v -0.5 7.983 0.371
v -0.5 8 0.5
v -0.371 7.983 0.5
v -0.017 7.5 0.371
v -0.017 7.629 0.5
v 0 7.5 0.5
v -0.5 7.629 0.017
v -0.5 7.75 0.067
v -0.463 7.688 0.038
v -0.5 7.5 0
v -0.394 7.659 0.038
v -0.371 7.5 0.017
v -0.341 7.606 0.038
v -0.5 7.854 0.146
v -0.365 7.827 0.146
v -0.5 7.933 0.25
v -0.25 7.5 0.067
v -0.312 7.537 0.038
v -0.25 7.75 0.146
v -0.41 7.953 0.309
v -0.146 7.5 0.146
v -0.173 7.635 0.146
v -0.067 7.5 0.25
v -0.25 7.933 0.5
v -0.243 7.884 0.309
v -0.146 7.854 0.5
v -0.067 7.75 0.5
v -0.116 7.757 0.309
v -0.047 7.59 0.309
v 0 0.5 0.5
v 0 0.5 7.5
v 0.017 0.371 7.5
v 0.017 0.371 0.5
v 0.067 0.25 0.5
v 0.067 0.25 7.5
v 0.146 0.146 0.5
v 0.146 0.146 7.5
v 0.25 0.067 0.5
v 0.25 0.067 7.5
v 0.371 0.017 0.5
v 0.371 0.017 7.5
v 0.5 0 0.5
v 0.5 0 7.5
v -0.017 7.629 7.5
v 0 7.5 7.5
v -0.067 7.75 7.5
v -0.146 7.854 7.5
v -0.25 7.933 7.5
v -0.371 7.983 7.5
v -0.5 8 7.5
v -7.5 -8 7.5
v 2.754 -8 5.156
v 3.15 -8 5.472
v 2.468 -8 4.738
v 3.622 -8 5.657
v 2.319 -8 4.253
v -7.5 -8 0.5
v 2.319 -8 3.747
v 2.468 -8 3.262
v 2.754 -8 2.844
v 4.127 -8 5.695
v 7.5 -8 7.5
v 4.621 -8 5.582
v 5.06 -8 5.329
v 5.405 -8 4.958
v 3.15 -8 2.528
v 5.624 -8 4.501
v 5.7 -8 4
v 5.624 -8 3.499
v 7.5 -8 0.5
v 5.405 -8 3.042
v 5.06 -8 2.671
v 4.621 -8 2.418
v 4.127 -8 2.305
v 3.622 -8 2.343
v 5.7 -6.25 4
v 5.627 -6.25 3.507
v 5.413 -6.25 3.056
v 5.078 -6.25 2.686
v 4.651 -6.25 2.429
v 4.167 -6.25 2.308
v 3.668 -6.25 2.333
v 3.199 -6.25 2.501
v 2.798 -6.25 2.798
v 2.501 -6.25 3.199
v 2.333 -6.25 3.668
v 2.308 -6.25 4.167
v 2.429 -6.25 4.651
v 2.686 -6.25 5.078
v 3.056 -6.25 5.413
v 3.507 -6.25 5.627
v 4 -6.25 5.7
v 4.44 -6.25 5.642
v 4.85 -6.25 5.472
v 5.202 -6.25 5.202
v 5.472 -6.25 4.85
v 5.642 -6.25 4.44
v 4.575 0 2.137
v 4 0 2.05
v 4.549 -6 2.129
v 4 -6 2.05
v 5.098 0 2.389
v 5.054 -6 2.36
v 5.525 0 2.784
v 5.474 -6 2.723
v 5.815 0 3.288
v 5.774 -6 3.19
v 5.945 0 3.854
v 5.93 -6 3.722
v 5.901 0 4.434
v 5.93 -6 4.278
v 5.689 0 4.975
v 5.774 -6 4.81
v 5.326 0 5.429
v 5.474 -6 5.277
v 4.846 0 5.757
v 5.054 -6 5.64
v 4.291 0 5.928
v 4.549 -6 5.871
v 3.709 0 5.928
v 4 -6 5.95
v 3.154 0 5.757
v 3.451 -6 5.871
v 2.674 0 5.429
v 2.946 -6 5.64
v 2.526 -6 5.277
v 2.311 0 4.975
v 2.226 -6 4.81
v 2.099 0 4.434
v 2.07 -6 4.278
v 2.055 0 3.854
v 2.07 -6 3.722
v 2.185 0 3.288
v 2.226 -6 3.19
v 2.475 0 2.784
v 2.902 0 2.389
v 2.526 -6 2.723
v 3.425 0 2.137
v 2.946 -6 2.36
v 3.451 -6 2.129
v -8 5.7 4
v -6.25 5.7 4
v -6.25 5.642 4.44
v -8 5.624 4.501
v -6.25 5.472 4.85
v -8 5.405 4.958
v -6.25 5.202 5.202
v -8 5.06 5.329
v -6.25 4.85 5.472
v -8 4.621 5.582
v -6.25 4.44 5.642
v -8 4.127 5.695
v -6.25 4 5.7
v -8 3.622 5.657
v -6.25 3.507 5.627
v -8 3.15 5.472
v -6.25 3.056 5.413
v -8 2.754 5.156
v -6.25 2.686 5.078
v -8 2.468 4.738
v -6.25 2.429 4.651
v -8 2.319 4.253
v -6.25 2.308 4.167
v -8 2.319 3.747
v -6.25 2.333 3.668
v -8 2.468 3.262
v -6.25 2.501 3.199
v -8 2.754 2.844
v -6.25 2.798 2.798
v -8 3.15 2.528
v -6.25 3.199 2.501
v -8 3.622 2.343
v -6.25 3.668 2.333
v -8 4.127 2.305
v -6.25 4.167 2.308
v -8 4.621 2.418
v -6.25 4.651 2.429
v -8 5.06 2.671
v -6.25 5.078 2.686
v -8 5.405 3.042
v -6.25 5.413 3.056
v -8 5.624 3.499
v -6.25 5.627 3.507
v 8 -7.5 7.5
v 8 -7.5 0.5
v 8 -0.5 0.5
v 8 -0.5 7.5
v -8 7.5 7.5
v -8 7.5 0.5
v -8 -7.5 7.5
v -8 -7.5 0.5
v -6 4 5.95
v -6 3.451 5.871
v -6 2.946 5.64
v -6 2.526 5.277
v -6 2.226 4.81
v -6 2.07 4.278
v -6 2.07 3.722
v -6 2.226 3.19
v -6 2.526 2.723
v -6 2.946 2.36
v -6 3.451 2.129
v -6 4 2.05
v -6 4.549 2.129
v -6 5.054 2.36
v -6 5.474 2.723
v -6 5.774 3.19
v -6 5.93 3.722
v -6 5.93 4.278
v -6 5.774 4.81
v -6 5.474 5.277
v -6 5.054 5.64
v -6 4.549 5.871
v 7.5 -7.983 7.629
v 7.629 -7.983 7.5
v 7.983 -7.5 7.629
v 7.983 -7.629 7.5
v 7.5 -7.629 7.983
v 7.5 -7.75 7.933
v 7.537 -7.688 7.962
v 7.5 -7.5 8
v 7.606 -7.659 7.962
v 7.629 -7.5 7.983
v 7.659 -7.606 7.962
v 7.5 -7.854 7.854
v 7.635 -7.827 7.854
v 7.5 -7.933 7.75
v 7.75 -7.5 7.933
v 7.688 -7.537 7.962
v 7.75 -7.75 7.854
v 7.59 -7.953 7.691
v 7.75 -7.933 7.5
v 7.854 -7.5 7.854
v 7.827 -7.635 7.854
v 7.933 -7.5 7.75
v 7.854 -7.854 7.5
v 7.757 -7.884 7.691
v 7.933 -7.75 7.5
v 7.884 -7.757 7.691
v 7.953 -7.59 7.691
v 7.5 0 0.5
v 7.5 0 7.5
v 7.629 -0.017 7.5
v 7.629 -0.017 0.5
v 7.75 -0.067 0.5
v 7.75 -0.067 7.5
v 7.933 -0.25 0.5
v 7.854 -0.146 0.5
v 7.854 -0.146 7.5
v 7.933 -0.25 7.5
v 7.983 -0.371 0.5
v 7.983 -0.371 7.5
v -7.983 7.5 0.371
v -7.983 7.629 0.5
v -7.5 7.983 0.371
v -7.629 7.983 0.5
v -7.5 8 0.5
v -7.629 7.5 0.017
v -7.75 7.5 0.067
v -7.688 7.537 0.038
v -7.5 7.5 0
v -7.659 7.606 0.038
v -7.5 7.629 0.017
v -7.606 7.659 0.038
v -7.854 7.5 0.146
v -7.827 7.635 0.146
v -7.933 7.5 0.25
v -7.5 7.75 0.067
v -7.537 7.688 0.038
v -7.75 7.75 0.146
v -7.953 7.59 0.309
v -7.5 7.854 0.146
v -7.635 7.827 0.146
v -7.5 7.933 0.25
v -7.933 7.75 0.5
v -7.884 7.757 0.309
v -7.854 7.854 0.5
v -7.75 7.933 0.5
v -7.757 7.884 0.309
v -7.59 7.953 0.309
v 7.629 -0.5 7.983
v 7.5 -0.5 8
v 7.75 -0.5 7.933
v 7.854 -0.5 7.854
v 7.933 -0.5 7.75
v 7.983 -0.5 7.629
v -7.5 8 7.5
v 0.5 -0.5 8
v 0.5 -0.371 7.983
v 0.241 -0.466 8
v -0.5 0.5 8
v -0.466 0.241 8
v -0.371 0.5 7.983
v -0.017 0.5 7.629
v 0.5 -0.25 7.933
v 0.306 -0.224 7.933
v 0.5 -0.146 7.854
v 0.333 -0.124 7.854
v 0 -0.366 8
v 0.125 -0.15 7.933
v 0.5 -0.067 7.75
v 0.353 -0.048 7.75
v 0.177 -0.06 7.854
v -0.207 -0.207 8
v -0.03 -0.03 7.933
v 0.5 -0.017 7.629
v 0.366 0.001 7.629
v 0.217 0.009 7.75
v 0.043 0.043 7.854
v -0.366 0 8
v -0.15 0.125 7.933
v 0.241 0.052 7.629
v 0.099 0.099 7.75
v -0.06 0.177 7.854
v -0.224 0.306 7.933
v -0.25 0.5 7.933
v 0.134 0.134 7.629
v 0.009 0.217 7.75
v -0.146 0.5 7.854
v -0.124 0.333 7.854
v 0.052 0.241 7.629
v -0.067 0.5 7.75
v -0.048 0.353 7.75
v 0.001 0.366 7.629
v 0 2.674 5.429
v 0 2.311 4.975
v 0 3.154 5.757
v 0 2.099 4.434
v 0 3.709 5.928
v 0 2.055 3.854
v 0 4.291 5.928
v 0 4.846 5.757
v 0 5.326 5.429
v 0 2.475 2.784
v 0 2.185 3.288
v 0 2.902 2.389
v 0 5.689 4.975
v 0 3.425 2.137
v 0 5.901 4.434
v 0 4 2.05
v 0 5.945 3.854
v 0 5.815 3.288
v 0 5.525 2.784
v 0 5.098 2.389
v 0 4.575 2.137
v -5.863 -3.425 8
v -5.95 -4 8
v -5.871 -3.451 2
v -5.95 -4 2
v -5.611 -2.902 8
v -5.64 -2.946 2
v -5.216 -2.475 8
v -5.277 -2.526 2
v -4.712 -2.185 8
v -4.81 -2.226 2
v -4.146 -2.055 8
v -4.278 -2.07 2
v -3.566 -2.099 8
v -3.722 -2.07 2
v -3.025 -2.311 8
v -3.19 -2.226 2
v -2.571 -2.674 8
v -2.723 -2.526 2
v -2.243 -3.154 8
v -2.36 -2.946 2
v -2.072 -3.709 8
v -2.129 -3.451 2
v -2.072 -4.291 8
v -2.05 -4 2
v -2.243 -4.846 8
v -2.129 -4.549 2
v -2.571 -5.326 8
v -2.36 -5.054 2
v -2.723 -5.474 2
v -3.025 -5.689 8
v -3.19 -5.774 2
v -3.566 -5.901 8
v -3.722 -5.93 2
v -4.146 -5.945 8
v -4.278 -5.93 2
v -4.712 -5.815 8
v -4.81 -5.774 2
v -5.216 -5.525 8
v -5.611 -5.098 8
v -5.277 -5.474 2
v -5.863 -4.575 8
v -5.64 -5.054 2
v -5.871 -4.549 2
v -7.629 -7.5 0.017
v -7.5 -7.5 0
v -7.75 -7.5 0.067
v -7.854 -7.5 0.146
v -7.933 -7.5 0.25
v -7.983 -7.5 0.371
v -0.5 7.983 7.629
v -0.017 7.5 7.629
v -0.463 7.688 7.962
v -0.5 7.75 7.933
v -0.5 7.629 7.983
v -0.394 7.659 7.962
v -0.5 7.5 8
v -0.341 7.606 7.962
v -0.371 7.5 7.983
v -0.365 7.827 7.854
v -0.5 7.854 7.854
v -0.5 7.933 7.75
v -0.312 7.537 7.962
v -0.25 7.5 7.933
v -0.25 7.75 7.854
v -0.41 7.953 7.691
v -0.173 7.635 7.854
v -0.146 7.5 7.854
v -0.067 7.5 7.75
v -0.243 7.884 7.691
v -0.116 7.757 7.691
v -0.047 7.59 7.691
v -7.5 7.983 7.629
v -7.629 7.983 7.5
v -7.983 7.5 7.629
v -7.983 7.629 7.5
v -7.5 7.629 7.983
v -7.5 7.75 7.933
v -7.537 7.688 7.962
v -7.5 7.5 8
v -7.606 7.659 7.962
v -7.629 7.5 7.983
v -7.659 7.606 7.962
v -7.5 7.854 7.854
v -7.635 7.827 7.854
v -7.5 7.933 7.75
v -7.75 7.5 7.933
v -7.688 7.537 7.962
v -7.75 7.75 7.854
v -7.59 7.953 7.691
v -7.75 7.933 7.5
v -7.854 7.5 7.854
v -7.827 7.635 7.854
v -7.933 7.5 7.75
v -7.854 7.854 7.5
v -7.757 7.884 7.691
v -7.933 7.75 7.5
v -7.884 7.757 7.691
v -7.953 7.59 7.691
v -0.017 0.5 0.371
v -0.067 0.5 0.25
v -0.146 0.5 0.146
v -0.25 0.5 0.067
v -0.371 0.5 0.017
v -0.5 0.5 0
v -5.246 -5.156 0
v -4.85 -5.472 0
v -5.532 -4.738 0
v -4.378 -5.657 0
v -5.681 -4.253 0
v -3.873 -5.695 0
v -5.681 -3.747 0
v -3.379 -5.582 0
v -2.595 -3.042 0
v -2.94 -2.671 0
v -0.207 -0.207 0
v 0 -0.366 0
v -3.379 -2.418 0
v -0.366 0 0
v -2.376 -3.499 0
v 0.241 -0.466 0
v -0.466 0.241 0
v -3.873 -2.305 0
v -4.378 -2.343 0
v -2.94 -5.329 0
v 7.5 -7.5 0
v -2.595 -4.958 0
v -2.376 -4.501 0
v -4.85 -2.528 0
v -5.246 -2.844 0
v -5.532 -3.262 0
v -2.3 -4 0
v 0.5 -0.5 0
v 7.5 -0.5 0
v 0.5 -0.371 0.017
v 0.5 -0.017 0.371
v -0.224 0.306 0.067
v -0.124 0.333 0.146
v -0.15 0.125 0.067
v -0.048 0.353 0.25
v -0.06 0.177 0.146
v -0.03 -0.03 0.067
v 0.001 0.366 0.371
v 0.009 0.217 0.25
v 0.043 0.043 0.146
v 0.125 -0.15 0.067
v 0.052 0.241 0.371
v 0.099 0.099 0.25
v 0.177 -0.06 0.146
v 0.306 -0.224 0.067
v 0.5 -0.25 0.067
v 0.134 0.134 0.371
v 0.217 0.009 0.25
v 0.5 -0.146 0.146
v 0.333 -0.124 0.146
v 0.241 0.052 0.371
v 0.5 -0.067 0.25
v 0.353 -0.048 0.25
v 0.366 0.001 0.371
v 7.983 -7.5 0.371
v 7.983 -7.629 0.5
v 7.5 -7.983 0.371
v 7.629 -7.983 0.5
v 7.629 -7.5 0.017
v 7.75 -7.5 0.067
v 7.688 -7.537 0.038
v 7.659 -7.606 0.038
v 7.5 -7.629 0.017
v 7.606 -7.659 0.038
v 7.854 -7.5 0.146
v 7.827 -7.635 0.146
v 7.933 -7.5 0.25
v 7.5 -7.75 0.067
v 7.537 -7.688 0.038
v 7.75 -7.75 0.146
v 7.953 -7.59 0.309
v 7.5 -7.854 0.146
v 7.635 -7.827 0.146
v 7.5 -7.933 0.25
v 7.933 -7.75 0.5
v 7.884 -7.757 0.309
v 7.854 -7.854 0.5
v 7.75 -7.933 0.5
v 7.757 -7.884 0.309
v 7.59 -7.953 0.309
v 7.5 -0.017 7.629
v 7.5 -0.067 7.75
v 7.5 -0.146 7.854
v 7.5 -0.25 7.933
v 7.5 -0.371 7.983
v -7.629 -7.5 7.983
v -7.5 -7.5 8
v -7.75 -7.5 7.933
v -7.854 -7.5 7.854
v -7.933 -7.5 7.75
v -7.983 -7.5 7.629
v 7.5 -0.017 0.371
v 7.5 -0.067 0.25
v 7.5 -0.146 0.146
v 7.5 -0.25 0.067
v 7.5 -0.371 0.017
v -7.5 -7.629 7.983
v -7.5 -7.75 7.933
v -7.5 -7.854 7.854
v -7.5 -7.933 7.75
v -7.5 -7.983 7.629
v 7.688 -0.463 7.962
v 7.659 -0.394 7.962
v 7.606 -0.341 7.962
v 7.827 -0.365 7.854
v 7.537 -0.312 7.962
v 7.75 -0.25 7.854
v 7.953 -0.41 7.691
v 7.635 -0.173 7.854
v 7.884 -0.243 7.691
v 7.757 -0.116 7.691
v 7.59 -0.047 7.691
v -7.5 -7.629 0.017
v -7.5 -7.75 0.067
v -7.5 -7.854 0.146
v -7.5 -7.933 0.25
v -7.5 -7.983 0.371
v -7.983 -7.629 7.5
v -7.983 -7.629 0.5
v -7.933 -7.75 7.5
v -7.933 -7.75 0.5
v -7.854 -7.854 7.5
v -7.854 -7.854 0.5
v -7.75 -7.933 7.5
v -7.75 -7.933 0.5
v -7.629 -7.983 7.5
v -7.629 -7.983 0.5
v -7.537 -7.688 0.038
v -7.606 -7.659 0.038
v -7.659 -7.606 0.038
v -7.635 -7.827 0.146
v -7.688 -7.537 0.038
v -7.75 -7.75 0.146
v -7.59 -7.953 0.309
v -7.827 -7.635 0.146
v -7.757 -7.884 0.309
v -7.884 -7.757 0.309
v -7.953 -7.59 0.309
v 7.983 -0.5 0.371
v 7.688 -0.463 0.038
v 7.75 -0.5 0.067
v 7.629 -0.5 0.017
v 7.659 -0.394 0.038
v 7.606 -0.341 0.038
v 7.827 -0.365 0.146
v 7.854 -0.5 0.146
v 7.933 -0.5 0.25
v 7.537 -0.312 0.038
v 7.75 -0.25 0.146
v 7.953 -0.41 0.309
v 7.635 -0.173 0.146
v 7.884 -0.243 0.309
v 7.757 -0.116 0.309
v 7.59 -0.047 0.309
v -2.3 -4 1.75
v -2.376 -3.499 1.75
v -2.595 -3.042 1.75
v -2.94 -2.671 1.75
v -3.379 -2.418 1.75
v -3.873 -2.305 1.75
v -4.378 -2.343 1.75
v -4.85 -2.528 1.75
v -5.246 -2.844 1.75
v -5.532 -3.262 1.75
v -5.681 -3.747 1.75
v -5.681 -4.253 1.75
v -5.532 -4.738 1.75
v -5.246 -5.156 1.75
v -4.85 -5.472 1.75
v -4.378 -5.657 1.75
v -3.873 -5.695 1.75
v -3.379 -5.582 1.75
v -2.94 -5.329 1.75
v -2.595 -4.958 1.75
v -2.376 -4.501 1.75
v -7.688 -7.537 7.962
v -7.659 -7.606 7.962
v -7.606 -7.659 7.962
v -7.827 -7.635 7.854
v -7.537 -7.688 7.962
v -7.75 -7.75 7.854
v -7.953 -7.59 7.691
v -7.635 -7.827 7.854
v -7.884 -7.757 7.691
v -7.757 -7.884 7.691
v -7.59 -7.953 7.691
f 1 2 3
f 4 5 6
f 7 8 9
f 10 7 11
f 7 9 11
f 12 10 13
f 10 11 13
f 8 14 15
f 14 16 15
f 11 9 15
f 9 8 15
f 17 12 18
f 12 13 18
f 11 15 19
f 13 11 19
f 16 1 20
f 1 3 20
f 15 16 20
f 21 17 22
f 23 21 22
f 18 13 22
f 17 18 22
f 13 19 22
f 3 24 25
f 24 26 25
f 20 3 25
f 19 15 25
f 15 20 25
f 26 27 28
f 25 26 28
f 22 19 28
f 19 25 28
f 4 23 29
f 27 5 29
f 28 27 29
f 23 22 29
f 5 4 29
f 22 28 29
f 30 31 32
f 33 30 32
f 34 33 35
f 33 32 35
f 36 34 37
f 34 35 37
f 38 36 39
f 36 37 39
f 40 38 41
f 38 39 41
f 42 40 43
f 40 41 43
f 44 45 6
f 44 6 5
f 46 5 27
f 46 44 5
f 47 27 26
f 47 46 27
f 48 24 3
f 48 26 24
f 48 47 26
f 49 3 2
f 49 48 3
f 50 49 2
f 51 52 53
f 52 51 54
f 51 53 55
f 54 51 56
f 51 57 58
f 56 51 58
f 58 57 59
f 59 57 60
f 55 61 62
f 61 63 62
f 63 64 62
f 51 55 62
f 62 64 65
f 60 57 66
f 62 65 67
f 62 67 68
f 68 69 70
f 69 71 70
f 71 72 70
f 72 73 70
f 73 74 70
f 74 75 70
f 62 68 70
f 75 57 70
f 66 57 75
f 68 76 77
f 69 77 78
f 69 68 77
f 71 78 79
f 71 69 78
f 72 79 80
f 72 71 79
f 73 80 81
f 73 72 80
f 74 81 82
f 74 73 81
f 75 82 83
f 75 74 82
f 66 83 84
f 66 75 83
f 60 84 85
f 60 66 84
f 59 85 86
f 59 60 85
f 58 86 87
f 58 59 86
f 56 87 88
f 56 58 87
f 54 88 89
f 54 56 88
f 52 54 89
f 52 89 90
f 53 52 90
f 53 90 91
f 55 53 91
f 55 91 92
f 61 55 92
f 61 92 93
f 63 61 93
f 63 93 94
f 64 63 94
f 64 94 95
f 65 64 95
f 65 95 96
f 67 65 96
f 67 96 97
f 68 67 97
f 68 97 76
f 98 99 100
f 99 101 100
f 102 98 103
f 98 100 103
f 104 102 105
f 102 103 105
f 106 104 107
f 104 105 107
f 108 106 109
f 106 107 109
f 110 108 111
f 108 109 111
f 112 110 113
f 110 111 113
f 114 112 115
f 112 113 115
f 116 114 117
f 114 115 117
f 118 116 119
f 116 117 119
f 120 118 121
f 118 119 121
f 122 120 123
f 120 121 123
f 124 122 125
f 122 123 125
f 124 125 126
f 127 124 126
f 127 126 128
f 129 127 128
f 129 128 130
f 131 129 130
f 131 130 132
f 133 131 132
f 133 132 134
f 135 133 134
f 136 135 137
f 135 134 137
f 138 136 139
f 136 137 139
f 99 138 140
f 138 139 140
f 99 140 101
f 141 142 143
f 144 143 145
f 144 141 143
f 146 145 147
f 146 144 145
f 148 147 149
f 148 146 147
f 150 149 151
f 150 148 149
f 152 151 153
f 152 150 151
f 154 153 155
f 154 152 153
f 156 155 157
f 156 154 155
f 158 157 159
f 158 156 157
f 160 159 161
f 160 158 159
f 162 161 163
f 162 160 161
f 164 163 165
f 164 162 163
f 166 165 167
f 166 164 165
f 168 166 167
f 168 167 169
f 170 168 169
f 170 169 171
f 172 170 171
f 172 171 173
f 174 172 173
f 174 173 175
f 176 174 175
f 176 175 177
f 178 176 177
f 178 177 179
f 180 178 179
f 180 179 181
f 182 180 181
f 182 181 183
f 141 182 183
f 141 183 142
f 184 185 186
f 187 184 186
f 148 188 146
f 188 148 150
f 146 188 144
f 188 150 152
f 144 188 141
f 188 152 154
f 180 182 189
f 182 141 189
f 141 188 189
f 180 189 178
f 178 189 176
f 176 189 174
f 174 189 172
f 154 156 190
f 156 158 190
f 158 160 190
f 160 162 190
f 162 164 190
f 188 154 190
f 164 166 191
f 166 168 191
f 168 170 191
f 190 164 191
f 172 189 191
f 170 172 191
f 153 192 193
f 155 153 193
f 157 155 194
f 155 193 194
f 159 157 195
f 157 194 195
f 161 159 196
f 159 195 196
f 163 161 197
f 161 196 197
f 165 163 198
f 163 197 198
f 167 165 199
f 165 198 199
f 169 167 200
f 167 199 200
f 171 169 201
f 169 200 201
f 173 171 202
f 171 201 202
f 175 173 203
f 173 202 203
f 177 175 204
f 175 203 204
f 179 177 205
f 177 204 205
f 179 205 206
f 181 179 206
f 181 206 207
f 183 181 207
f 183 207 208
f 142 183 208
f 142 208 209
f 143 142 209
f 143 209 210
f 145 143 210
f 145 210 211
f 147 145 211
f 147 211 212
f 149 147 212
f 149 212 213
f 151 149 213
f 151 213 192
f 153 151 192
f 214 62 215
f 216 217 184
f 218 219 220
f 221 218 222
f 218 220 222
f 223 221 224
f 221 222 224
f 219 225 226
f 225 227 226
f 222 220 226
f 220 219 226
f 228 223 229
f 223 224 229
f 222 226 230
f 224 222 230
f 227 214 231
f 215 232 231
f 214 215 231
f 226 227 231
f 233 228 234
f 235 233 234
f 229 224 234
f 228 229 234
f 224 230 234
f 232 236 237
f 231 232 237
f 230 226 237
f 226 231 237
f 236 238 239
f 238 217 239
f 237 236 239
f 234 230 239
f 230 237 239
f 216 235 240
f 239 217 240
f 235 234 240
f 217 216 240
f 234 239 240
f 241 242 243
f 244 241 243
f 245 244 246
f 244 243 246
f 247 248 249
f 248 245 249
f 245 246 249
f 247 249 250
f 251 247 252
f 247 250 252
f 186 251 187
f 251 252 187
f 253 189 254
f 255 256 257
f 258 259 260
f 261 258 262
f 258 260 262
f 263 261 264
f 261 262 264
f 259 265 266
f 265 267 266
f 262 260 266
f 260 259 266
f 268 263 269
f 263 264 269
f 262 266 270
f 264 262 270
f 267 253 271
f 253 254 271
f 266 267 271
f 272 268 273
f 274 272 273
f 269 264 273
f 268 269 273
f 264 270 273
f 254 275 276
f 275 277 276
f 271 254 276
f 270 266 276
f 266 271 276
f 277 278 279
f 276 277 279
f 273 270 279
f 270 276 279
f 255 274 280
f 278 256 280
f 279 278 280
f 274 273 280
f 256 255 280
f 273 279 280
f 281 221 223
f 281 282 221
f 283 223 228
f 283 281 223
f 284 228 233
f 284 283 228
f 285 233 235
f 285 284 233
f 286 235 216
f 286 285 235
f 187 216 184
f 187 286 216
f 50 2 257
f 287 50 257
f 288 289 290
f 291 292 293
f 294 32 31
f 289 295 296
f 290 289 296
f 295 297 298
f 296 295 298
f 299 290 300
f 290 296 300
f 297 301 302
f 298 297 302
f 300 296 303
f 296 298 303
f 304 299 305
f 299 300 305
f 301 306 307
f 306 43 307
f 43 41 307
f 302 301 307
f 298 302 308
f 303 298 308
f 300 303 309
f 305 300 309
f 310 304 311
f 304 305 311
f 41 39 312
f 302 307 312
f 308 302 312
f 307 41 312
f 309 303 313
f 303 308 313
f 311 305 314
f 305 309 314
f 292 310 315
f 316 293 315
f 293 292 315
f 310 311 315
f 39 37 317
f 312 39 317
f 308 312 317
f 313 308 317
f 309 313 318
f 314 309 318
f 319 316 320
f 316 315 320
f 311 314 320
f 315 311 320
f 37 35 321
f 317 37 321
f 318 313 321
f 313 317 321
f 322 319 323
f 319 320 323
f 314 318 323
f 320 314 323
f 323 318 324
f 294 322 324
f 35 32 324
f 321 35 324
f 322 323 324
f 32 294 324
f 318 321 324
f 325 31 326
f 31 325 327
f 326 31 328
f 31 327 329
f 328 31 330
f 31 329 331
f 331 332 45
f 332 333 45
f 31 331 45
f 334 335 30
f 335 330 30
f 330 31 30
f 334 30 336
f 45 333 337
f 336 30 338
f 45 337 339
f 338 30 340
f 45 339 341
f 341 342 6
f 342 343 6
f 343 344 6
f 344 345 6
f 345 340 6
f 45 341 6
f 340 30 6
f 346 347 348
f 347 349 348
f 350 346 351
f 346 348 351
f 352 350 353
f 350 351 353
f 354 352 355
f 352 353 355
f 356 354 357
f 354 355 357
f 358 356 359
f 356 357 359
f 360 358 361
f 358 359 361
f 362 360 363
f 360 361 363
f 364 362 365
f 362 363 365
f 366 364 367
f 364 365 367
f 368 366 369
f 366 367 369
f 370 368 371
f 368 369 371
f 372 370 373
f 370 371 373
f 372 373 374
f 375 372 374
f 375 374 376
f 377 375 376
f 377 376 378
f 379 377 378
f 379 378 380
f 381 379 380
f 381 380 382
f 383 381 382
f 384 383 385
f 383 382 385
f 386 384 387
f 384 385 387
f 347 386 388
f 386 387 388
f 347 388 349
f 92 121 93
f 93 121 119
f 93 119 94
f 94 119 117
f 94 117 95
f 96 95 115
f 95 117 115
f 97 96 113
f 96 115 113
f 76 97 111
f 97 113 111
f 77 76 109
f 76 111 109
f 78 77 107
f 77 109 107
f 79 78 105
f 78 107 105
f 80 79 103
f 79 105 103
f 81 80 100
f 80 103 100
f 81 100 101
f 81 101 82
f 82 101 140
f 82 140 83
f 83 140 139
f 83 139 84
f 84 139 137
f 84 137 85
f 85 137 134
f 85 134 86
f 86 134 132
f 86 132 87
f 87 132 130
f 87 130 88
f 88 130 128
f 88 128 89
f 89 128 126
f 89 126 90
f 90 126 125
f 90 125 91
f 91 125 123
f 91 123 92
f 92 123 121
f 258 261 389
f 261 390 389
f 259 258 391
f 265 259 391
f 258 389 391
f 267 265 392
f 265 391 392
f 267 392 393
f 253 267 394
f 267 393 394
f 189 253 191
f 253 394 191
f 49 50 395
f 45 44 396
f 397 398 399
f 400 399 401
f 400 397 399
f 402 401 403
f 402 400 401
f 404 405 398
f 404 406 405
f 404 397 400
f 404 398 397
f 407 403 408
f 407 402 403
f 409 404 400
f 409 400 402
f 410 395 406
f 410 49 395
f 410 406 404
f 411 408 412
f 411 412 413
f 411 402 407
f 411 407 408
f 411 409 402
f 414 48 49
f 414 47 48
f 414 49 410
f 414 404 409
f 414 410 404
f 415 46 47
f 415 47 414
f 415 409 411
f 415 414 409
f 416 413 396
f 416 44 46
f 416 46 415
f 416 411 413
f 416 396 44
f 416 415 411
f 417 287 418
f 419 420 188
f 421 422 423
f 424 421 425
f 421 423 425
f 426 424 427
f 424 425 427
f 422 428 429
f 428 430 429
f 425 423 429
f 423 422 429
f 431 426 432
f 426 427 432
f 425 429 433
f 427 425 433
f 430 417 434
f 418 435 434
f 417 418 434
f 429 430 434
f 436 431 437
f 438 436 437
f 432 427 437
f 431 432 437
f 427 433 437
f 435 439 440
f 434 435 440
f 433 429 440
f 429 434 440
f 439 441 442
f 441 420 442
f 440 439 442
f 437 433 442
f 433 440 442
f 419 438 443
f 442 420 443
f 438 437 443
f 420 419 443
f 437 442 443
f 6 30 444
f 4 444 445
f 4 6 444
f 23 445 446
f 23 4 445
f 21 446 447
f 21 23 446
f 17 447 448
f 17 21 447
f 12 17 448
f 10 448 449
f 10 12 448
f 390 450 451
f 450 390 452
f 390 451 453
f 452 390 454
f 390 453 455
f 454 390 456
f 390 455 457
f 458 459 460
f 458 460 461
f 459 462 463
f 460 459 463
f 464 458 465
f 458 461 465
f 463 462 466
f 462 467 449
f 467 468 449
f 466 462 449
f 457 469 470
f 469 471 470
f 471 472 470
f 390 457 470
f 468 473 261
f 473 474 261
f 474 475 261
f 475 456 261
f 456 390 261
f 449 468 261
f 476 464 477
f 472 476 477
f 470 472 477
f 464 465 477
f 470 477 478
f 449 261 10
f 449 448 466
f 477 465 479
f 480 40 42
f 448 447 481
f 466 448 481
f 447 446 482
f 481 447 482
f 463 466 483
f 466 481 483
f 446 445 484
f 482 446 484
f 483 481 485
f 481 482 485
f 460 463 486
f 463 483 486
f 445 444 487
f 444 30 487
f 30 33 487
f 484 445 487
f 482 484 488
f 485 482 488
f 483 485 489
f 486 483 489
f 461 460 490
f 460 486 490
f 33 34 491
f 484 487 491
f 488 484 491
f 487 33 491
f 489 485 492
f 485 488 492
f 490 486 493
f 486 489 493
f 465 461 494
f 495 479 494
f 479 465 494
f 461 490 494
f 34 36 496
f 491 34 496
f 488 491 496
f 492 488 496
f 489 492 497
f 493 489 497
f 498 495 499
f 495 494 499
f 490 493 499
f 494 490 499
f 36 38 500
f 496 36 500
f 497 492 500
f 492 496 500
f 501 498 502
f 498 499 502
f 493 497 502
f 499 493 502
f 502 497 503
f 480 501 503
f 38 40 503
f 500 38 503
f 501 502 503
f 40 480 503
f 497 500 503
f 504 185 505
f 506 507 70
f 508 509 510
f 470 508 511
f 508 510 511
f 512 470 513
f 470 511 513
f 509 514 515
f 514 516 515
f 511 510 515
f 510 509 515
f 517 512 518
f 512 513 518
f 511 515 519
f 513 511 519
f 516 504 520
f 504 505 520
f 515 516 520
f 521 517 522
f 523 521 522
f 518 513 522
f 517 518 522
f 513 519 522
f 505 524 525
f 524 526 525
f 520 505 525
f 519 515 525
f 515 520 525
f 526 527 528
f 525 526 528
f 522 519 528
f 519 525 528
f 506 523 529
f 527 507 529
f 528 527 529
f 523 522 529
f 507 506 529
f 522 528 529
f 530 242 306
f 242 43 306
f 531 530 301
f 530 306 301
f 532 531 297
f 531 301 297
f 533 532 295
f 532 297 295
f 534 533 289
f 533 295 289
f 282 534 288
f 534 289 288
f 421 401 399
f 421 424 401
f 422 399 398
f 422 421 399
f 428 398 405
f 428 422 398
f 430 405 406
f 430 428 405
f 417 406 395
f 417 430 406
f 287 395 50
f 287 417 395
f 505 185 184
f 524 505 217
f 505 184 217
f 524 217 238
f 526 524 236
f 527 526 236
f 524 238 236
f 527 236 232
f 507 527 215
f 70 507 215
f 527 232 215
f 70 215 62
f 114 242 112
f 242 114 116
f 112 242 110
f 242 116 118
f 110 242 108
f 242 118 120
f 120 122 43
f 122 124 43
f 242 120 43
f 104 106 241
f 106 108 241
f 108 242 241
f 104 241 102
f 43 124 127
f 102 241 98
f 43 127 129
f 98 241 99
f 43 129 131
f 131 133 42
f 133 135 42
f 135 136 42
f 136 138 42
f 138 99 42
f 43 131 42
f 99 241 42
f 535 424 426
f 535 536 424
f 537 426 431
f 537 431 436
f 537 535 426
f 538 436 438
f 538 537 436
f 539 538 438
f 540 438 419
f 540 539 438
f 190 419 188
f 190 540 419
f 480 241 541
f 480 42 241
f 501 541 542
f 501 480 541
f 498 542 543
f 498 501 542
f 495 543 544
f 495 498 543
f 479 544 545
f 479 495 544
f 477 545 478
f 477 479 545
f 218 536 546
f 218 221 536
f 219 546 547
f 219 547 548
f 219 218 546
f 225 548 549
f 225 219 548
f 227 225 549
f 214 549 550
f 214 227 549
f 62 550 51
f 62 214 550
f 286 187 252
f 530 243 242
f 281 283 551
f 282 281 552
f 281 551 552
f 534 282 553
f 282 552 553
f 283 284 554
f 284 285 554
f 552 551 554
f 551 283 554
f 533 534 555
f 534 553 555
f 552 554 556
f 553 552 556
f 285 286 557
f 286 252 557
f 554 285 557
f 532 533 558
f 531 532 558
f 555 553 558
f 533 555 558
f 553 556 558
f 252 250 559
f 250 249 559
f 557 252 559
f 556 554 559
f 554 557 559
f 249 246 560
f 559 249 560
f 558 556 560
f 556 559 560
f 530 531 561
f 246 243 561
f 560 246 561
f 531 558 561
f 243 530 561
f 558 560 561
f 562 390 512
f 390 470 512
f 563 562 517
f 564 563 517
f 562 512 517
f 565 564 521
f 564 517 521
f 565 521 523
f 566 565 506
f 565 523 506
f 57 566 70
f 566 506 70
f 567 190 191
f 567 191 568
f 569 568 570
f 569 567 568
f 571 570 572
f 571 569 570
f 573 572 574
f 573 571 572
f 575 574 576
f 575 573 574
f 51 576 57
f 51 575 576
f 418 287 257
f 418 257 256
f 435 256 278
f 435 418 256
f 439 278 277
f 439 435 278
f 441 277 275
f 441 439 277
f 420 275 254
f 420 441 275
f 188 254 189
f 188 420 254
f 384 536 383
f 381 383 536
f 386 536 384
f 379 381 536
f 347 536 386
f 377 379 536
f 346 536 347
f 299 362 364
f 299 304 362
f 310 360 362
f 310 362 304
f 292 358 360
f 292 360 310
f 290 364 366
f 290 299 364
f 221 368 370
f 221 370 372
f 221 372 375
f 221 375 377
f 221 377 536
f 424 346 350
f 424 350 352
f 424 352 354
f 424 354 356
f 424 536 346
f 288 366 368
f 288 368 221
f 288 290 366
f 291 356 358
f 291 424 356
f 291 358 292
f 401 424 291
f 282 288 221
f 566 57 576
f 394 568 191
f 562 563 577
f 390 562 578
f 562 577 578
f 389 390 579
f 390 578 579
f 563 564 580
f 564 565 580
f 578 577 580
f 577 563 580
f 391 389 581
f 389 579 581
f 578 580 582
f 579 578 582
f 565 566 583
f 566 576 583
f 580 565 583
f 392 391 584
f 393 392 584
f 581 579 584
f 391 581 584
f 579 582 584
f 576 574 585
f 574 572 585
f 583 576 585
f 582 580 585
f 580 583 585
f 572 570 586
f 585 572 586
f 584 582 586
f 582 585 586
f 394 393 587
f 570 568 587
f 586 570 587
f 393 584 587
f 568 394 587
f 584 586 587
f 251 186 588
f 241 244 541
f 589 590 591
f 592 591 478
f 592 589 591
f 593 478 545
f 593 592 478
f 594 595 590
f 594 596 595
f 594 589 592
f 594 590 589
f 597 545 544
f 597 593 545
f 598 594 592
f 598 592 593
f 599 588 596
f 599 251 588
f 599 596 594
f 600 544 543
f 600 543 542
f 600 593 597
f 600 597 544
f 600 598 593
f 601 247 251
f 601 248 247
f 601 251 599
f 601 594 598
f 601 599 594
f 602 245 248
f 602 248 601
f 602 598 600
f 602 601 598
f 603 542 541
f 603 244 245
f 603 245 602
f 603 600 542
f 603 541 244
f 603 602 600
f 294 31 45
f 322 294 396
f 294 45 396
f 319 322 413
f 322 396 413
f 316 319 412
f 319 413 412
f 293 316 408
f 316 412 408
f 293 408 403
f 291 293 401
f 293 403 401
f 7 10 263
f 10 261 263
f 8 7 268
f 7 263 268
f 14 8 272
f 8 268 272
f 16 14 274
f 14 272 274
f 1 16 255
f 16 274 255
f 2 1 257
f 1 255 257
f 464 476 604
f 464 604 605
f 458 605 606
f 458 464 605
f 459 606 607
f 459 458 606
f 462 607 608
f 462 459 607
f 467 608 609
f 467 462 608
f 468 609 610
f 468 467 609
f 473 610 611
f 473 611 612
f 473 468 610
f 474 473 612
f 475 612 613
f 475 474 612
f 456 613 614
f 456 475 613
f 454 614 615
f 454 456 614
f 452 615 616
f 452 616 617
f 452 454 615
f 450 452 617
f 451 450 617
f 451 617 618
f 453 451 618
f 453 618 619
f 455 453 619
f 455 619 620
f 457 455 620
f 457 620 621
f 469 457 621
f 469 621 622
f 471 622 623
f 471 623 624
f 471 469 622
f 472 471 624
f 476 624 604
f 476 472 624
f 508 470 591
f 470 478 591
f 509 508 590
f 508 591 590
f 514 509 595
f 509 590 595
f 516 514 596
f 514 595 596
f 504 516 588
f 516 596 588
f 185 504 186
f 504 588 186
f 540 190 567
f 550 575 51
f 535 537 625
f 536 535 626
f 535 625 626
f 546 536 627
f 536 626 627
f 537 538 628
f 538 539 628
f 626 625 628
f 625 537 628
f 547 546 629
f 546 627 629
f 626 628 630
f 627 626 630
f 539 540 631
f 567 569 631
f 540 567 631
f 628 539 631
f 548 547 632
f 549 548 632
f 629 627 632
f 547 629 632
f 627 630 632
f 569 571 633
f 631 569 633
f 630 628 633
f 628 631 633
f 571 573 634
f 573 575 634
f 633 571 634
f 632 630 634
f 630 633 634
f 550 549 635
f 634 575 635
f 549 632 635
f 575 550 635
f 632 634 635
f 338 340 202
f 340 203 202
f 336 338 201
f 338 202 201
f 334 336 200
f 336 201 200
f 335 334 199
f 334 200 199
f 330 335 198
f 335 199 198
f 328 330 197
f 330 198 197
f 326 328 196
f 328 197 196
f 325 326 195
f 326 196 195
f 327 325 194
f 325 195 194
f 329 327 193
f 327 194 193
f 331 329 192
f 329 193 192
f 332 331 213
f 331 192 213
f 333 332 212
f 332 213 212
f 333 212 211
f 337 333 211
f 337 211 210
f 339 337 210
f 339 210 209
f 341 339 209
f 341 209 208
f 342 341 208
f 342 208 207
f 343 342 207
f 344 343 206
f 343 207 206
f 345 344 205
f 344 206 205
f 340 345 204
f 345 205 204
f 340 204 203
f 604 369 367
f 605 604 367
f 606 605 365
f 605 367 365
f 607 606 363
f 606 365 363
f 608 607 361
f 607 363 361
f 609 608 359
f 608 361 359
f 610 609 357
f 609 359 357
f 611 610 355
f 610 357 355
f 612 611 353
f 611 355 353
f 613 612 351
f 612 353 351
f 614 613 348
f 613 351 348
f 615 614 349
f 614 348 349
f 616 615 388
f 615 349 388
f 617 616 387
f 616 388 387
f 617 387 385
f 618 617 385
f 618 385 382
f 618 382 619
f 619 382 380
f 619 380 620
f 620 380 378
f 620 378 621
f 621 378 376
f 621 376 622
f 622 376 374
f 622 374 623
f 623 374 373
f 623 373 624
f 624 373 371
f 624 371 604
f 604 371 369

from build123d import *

# Parameters (mm, degrees)
BOSS_EXTRUDE1_DEPTH                      = 8
F_3_9_3_9_DIAMETER_HOLE1_D               = 3.9
F_3_9_3_9_DIAMETER_HOLE1_DEPTH           = 6
F_3_9_3_9_DIAMETER_HOLE1_TIP             = 1.95
F_3_9_3_9_DIAMETER_HOLE1_ON_FACE_2_D     = 3.9
F_3_9_3_9_DIAMETER_HOLE1_ON_FACE_2_DEPTH = 6
F_3_9_3_9_DIAMETER_HOLE1_ON_FACE_2_TIP   = 1.95
F_3_9_3_9_DIAMETER_HOLE1_ON_FACE_3_D     = 3.9
F_3_9_3_9_DIAMETER_HOLE1_ON_FACE_3_DEPTH = 6
F_3_9_3_9_DIAMETER_HOLE1_ON_FACE_3_TIP   = 1.95
F_3_4_START                              = -8
F_3_4_3_4_DIAMETER_HOLE1_OUTLINE_R       = 1.7
F_3_4_3_4_DIAMETER_HOLE1_DEPTH           = 1.7500001
F_3_4_3_4_DIAMETER_HOLE1_2_OUTLINE_R     = 1.7
F_3_4_3_4_DIAMETER_HOLE1_2_DEPTH         = 1.7500001
F_3_4_3_4_DIAMETER_HOLE1_3_OUTLINE_R     = 1.7
F_3_4_3_4_DIAMETER_HOLE1_3_DEPTH         = 1.7500001
FILLET1_R                                = 0.5


# Read off the part's stored shape, not the designer's step: Ø3.4 (3.4) Diameter Hole1
with BuildPart() as part:
    # Sketch1 → Boss-Extrude1 (new body)
    with BuildSketch(Plane.XY):
        Polygon((0, 0), (0, 8), (-8, 8), (-8, -8), (8, -8), (8, 0), align=None)
    extrude(amount=BOSS_EXTRUDE1_DEPTH)

    # Ø3.9 (3.9) Diameter Hole1
    with Locations(Plane(origin=(-4, -4, 8), x_dir=(1, 0, 0), z_dir=(0, 0, 1))):
        with Locations((0, 0)):
            Hole(F_3_9_3_9_DIAMETER_HOLE1_D / 2, depth=F_3_9_3_9_DIAMETER_HOLE1_DEPTH)
            with Locations((0, 0, -(F_3_9_3_9_DIAMETER_HOLE1_DEPTH + F_3_9_3_9_DIAMETER_HOLE1_TIP / 2))):  # 90° drill point
                Cone(0, F_3_9_3_9_DIAMETER_HOLE1_D / 2, F_3_9_3_9_DIAMETER_HOLE1_TIP, mode=Mode.SUBTRACT)

    # Ø3.9 (3.9) Diameter Hole1 on face 2
    with Locations(Plane(origin=(0, 4, 4), x_dir=(0, 0, 1), z_dir=(1, 0, 0))):
        with Locations((0, 0)):
            Hole(F_3_9_3_9_DIAMETER_HOLE1_ON_FACE_2_D / 2, depth=F_3_9_3_9_DIAMETER_HOLE1_ON_FACE_2_DEPTH)
            with Locations((0, 0, -(F_3_9_3_9_DIAMETER_HOLE1_ON_FACE_2_DEPTH + F_3_9_3_9_DIAMETER_HOLE1_ON_FACE_2_TIP / 2))):  # 90° drill point
                Cone(0, F_3_9_3_9_DIAMETER_HOLE1_ON_FACE_2_D / 2, F_3_9_3_9_DIAMETER_HOLE1_ON_FACE_2_TIP, mode=Mode.SUBTRACT)

    # Ø3.9 (3.9) Diameter Hole1 on face 3
    with Locations(Plane(origin=(4, 0, 4), x_dir=(0, 0, 1), z_dir=(0, 1, 0))):
        with Locations((0, 0)):
            Hole(F_3_9_3_9_DIAMETER_HOLE1_ON_FACE_3_D / 2, depth=F_3_9_3_9_DIAMETER_HOLE1_ON_FACE_3_DEPTH)
            with Locations((0, 0, -(F_3_9_3_9_DIAMETER_HOLE1_ON_FACE_3_DEPTH + F_3_9_3_9_DIAMETER_HOLE1_ON_FACE_3_TIP / 2))):  # 90° drill point
                Cone(0, F_3_9_3_9_DIAMETER_HOLE1_ON_FACE_3_D / 2, F_3_9_3_9_DIAMETER_HOLE1_ON_FACE_3_TIP, mode=Mode.SUBTRACT)

    # Ø3.4 (3.4) Diameter Hole1 outline → Ø3.4 (3.4) Diameter Hole1 (cut)
    with BuildSketch(Plane(origin=(0, 0, 0), x_dir=(1, 0, 0), z_dir=(0, 1, 0)).offset(F_3_4_START)):
        with Locations((4, -4)):
            Circle(F_3_4_3_4_DIAMETER_HOLE1_OUTLINE_R)
    extrude(amount=F_3_4_3_4_DIAMETER_HOLE1_DEPTH, mode=Mode.SUBTRACT)

    # 3.4 _3.4_ Diameter Hole1 2 outline → 3.4 _3.4_ Diameter Hole1 2 (cut)
    with BuildSketch(Plane.YZ.offset(F_3_4_START)):
        with Locations((4, 4)):
            Circle(F_3_4_3_4_DIAMETER_HOLE1_2_OUTLINE_R)
    extrude(amount=F_3_4_3_4_DIAMETER_HOLE1_2_DEPTH, mode=Mode.SUBTRACT)

    # 3.4 _3.4_ Diameter Hole1 3 outline → 3.4 _3.4_ Diameter Hole1 3 (cut)
    with BuildSketch(Plane.XY):
        with Locations((-4, -4)):
            Circle(F_3_4_3_4_DIAMETER_HOLE1_3_OUTLINE_R)
    extrude(amount=F_3_4_3_4_DIAMETER_HOLE1_3_DEPTH, mode=Mode.SUBTRACT)

    # Fillet1
    fillet1_edges = [part.edges().sort_by_distance(p)[0] for p in [
        (8, 0, 4),
        (8, -8, 4),
        (-8, -8, 4),
        (-8, 8, 4),
        (0, 8, 4),
        (0, 0, 4),
        (-4, 8, 8),
        (-8, 0, 8),
        (0, -8, 8),
        (8, -4, 8),
        (4, 0, 8),
        (8, -4, 0),
        (0, -8, 0),
        (-8, 0, 0),
        (-4, 8, 0),
        (0, 4, 0),
        (4, 0, 0),
        (0, 4, 8),
    ]]
    fillet(fillet1_edges, radius=FILLET1_R)


solid = part.part
